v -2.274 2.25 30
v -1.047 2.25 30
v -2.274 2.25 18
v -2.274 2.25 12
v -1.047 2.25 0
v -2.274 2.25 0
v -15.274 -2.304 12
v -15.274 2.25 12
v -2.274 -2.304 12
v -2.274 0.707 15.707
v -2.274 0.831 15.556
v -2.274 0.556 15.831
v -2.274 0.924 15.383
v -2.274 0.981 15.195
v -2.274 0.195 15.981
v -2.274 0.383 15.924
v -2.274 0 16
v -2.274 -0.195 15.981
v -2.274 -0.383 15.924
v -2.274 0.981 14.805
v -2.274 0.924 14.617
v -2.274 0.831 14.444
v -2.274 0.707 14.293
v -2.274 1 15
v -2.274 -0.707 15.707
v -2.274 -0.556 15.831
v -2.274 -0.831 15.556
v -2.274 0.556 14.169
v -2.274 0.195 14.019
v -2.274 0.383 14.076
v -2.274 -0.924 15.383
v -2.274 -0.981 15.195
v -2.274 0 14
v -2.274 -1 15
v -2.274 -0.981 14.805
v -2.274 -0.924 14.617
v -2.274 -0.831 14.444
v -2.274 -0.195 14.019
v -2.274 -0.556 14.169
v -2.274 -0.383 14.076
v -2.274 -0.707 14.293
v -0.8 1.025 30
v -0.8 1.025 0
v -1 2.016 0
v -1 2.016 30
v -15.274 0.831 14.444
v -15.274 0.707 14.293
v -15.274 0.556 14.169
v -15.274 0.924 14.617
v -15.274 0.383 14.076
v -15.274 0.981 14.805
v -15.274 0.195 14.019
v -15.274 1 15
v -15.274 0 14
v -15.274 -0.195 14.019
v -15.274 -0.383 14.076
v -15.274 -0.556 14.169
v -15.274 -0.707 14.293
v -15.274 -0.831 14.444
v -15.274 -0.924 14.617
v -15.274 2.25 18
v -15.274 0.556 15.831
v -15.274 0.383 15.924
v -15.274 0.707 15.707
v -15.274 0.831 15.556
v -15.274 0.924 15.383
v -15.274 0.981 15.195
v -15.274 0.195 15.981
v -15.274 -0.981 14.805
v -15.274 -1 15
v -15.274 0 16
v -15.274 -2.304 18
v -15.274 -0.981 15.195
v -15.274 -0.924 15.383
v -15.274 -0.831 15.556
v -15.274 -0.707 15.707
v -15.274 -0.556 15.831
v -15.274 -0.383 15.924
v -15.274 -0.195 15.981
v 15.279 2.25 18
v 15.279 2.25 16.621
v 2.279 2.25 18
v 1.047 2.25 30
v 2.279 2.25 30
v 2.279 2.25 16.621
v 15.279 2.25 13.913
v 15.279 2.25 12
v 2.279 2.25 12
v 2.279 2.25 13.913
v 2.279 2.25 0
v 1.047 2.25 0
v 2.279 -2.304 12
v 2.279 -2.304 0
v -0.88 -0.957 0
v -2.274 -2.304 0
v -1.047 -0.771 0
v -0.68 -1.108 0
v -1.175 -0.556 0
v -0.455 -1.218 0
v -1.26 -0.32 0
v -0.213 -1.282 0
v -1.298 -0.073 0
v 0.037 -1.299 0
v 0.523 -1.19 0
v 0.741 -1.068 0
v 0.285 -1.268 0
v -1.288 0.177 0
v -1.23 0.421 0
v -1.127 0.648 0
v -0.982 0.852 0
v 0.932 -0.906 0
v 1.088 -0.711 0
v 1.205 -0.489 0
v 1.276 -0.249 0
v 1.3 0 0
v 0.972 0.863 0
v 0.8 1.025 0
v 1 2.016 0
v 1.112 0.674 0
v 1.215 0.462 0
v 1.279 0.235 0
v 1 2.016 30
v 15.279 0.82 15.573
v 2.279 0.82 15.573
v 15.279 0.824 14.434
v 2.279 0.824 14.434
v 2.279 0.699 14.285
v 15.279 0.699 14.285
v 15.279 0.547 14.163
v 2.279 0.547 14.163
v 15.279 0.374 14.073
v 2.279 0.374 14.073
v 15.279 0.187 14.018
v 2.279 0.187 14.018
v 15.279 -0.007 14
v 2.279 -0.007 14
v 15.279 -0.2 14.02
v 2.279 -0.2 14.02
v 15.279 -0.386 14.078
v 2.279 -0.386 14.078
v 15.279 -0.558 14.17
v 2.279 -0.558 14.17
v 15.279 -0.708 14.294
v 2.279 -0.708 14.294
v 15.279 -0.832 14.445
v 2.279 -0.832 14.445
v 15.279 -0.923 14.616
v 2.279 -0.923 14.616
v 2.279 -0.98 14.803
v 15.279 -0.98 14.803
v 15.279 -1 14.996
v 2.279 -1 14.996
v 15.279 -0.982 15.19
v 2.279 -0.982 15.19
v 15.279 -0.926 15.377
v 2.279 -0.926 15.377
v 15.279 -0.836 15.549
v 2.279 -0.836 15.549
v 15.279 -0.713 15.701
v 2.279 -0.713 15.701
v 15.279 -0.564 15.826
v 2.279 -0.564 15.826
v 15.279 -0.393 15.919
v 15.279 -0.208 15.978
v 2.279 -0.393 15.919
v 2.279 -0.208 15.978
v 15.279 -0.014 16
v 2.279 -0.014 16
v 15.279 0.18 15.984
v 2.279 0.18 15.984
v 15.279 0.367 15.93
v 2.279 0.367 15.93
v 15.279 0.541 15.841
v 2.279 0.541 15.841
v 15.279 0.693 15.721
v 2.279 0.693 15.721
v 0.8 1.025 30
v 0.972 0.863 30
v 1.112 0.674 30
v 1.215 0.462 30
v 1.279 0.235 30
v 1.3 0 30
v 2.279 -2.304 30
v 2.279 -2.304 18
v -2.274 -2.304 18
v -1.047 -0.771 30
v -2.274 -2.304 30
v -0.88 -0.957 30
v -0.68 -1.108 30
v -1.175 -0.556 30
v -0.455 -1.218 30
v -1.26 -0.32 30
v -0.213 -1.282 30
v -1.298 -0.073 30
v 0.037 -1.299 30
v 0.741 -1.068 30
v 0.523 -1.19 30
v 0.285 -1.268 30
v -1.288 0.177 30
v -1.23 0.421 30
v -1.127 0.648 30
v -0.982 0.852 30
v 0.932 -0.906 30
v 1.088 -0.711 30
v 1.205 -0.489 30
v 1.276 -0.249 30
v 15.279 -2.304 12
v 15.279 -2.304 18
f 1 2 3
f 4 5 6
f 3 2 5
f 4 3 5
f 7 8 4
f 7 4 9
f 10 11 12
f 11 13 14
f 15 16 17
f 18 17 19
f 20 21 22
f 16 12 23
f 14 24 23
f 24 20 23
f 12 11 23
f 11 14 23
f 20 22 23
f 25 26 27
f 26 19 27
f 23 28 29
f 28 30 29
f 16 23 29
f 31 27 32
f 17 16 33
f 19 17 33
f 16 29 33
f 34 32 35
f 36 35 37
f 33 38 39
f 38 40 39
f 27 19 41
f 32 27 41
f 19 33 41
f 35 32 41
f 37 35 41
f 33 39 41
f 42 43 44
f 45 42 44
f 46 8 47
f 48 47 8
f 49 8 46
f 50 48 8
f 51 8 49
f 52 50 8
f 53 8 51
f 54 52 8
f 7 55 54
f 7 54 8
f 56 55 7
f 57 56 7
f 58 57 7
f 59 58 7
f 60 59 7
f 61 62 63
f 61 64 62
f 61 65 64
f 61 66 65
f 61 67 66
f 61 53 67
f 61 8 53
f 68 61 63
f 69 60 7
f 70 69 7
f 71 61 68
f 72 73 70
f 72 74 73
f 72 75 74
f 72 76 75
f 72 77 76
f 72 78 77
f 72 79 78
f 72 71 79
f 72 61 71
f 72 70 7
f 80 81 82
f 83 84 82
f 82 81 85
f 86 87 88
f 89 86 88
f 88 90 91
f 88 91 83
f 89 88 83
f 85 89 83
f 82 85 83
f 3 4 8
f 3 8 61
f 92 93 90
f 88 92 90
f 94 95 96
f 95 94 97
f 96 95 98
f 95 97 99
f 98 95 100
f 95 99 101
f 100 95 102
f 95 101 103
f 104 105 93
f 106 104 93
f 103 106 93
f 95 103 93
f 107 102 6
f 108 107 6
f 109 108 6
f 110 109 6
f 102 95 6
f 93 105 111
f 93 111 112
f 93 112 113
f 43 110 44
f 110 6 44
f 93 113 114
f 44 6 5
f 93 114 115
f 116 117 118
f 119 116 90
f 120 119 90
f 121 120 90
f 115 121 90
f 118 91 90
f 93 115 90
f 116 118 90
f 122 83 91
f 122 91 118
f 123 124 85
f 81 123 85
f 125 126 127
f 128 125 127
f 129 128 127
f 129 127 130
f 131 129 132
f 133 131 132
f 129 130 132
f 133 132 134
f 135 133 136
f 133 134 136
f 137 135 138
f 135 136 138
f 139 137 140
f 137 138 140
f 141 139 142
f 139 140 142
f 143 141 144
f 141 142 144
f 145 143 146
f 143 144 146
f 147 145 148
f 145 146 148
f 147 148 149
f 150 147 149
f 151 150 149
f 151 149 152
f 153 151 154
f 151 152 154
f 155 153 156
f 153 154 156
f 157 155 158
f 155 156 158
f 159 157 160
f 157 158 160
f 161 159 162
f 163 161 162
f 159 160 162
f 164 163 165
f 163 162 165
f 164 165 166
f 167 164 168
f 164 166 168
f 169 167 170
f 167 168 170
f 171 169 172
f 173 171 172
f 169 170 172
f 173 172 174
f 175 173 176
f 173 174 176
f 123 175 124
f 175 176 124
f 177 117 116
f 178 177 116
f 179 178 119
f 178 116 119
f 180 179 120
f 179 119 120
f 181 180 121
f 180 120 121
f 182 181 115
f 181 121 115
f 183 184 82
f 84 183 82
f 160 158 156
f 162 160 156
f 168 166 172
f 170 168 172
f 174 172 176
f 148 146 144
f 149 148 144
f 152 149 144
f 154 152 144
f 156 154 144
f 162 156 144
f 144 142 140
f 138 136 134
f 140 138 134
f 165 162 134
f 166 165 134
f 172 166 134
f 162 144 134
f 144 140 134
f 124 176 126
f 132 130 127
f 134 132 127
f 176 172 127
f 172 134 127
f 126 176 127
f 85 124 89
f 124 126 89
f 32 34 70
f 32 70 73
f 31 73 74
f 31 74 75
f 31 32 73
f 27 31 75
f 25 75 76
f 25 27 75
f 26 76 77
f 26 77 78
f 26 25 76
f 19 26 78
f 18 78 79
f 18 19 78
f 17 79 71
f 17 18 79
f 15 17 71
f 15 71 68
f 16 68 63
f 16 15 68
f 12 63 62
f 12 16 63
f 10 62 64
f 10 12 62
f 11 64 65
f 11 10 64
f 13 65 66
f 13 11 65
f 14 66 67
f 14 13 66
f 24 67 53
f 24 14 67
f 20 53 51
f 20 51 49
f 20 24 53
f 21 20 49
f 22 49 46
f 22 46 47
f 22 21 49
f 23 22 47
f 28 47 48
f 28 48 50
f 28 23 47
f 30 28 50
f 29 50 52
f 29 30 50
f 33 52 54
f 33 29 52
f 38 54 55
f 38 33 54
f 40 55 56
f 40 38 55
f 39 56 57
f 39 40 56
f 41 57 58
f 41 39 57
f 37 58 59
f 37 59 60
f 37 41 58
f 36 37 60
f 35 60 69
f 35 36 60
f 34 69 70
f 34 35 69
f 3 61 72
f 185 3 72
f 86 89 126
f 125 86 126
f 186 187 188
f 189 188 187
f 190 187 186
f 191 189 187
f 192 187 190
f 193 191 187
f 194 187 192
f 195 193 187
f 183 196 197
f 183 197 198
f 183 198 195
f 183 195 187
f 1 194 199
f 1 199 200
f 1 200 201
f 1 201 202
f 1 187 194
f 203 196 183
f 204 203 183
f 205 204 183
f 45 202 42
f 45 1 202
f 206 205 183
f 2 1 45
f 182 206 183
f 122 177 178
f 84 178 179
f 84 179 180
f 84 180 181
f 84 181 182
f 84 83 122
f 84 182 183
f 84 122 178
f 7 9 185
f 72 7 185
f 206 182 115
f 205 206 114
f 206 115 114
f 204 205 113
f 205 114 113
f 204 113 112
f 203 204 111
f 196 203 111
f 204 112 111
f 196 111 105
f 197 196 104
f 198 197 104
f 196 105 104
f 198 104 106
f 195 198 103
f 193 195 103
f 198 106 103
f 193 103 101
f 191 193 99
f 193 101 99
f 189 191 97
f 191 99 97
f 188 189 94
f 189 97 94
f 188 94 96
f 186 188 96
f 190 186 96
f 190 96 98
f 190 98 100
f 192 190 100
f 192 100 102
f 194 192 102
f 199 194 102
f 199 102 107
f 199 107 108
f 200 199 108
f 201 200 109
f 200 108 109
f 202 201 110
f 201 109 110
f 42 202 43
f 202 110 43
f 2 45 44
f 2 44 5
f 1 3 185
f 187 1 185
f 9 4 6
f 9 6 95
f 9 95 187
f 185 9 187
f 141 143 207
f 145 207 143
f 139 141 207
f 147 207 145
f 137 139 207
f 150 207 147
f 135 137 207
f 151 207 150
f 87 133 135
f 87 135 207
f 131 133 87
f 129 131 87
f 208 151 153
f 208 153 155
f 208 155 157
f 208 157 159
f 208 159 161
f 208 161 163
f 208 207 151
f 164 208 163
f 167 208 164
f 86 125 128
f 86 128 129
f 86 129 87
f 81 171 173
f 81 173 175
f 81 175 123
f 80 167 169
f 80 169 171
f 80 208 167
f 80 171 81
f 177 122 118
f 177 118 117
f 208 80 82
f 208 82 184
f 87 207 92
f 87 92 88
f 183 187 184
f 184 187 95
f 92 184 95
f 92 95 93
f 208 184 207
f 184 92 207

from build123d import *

# Parameters (mm, degrees)
F1_DEPTH = 30
F3_DEPTH = 13
F4_W     = 4.553619
F4_H     = 6
F4_R     = 1
F5_DEPTH = 13


with BuildPart() as f1:
    # F0 (on Top) → F1 (new body)
    with BuildSketch(Plane.XY):
        with BuildLine():
            ThreePointArc((0.8, 1.024695), (1.168332, 0.570088), (1.3, 0))
            ThreePointArc((1.3, 0), (-0.570088, -1.168332), (-0.8, 1.024695))
            Line((-0.8, 1.024695), (-1, 2.015564))
            ThreePointArc((-1, 2.015564), (-1.185854, -1.912132), (2.25, 0))
            ThreePointArc((2.25, 0), (1.912132, 1.185854), (1, 2.015564))
            Line((1, 2.015564), (0.8, 1.024695))
        make_face()
        with BuildLine():
            Line((1.047319, 2.25), (1, 2.015564))
            ThreePointArc((1, 2.015564), (1.912132, 1.185854), (2.25, 0))
            ThreePointArc((2.25, 0), (-1.185854, -1.912132), (-1, 2.015564))
            Line((-1, 2.015564), (-1.047319, 2.25))
            Line((-1.047319, 2.25), (-2.274133, 2.25))
            Line((-2.274133, 2.25), (-2.274133, -2.303619))
            Line((-2.274133, -2.303619), (2.279486, -2.303619))
            Line((2.279486, -2.303619), (2.279486, 2.25))
            Line((2.279486, 2.25), (1.047319, 2.25))
        make_face()
    extrude(amount=F1_DEPTH)

    # F2 (on face) → F3 (join)
    with BuildSketch(Plane.YZ.offset(2.279486)):
        with BuildLine():
            ThreePointArc((0.824123, 14.433589), (-0.999993, 14.996283), (0.819889, 15.572522))
            Line((0.819889, 15.572522), (2.25, 16.621344))
            Line((2.25, 16.621344), (2.25, 18))
            Line((2.25, 18), (-2.303619, 18))
            Line((-2.303619, 18), (-2.303619, 12))
            Line((-2.303619, 12), (2.25, 12))
            Line((2.25, 12), (2.25, 13.912768))
            Line((2.25, 13.912768), (0.824123, 14.433589))
        make_face()
    extrude(amount=F3_DEPTH)

    # F4 (on face) → F5 (join)
    with BuildSketch(Plane(origin=(-2.274133, 0, 0), x_dir=(0, -1, 0), z_dir=(-1, 0, 0))):
        with Locations((0.026809, 15)):
            Rectangle(F4_W, F4_H)
        with Locations((0, 15)):
            Circle(F4_R, mode=Mode.SUBTRACT)
    extrude(amount=F5_DEPTH)


solid = f1.part
